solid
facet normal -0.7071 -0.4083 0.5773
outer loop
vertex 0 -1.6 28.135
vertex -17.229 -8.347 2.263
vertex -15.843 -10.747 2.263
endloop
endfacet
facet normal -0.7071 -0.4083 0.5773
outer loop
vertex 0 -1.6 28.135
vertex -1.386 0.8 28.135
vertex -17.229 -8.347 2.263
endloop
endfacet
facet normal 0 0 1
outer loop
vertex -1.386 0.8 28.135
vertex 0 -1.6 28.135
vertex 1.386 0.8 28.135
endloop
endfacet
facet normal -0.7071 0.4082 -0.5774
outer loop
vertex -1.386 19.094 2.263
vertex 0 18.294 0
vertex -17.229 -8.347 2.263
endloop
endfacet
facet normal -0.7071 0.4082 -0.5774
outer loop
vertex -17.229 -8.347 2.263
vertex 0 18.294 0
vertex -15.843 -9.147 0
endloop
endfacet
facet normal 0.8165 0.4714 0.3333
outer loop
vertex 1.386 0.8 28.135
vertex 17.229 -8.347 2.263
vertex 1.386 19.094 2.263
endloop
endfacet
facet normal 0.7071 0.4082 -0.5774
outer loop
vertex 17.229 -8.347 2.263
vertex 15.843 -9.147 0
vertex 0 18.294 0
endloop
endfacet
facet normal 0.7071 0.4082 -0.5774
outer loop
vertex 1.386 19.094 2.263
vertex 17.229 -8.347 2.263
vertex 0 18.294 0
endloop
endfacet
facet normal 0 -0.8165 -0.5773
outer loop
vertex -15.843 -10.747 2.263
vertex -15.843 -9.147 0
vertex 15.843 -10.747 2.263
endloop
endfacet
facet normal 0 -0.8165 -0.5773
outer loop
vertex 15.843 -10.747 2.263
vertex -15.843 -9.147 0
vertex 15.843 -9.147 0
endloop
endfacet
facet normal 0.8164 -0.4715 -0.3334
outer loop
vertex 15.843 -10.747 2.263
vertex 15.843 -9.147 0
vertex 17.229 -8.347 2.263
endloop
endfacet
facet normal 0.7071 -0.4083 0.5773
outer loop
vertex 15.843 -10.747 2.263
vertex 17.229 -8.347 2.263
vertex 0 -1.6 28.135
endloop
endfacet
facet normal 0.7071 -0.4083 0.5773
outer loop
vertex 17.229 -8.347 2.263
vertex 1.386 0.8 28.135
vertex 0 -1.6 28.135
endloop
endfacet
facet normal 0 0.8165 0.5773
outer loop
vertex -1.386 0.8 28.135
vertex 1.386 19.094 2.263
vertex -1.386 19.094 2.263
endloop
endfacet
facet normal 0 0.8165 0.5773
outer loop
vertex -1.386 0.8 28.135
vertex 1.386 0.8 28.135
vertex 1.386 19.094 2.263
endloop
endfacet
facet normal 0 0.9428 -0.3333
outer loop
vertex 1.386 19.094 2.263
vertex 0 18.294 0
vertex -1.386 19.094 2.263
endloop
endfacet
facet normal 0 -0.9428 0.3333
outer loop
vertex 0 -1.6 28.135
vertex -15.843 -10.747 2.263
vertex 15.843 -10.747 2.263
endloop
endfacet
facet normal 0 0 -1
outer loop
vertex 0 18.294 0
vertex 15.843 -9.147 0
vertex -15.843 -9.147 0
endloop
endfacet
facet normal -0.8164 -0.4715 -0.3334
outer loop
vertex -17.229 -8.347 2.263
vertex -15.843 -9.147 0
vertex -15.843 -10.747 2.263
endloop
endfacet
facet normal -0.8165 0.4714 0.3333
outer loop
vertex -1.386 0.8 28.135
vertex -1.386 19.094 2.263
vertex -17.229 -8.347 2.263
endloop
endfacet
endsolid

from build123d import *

# Parameters (mm, degrees)
F4_SIZE = 2.4


with BuildPart() as f3:
    # F0 (on Top) → F3 section 0
    with BuildSketch(Plane.XY, mode=Mode.PRIVATE) as f3_s0:
        Polygon((20, -11.5470053838), (0, 23.0940107676), (-20, -11.5470053838), align=None)
    loft([f3_s0.sketch, Vertex(0, 0, 32.66)])

    # F4
    f4_edges = [f3.edges().sort_by_distance(p)[0] for p in [
        (0, -11.547005, 0),
        (-10, 5.773503, 0),
        (10, 5.773503, 0),
        (10, -5.773503, 16.33),
        (-10, -5.773503, 16.33),
        (0, 11.547005, 16.33),
    ]]
    chamfer(f4_edges, length=F4_SIZE)


solid = f3.part
